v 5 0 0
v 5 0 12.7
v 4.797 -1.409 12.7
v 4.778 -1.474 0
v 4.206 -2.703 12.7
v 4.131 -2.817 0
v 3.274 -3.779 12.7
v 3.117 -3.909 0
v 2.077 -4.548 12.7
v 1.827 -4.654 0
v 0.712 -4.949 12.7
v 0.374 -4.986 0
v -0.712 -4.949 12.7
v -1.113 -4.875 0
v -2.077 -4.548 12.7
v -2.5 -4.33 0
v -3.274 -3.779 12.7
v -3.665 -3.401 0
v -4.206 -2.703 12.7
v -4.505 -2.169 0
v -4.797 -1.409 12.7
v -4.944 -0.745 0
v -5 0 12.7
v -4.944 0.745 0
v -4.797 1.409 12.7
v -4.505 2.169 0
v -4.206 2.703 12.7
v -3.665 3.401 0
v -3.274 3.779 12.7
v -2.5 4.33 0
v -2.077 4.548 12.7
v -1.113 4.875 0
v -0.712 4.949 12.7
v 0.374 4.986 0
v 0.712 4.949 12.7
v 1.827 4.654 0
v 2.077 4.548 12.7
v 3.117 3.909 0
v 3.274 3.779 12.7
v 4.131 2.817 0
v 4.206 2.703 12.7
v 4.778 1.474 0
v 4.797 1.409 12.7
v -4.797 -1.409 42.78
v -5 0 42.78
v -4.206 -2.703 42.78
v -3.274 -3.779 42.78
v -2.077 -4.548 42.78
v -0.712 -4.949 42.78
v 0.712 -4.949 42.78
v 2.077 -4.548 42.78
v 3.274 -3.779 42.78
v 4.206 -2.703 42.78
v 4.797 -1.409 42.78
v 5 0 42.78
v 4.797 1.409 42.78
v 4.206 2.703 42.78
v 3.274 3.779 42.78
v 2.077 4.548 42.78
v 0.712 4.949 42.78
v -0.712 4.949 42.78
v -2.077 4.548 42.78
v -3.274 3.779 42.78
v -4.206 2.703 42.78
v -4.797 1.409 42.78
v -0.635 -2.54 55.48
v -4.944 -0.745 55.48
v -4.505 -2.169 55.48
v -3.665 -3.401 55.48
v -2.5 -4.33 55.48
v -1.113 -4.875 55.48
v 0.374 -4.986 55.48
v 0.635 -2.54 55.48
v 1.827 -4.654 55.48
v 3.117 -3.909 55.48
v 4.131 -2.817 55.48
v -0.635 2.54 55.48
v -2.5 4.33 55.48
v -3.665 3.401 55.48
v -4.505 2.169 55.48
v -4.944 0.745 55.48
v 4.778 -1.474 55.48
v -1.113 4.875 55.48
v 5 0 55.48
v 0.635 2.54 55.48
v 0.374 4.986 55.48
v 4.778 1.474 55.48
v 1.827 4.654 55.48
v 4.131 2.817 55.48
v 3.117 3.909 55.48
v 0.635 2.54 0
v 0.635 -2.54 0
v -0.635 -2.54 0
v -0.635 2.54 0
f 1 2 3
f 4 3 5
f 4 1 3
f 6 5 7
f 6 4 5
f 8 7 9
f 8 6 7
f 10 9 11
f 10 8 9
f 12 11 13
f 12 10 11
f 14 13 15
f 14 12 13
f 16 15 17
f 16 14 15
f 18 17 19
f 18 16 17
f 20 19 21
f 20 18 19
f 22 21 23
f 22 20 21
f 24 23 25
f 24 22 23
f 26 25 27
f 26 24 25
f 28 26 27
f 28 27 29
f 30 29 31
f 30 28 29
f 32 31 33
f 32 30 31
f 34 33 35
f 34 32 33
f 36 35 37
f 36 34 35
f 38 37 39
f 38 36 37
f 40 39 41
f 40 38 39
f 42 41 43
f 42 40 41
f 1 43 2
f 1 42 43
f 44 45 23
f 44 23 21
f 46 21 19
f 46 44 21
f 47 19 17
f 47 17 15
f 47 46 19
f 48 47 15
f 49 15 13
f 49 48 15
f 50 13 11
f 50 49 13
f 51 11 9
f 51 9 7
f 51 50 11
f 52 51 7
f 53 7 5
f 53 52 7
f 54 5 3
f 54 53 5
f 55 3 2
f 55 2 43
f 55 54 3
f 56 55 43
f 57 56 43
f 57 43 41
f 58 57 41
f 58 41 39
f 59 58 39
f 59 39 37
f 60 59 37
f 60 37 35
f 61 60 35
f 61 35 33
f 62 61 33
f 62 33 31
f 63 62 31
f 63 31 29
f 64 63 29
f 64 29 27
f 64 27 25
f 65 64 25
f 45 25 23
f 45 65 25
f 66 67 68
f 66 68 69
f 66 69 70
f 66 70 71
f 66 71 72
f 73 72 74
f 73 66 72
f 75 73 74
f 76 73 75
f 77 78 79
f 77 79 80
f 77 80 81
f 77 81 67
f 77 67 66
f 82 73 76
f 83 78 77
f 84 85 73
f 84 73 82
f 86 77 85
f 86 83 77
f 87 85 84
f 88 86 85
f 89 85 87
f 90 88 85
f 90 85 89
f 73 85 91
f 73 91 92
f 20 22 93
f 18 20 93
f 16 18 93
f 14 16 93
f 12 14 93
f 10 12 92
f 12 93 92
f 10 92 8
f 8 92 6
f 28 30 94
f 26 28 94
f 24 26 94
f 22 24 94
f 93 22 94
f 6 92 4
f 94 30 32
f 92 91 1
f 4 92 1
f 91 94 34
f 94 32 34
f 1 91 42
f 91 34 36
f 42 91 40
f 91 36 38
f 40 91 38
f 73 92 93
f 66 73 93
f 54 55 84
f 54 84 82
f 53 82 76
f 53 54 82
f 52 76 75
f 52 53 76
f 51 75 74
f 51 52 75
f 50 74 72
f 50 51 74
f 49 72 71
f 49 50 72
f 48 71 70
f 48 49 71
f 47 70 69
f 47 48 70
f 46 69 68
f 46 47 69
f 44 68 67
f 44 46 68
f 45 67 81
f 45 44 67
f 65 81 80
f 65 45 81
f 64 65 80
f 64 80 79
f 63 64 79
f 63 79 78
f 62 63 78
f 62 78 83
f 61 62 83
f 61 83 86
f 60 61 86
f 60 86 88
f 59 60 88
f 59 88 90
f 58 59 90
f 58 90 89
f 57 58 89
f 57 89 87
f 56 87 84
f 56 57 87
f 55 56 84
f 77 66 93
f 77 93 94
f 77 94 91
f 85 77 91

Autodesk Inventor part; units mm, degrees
ref_plane "YZ Plane" through (0, 0, 0) normal (1, 0, 0) x (0, 1, 0)
ref_plane "XZ Plane" through (0, 0, 0) normal (0, 1, 0) x (-1, 0, 0)
sketch "Sketch1" plane through (0, 0, 0) normal (0, 0, 1) x (1, 0, 0)
  circle A0 centre (0, 0) radius 5
  dimension "d0" = 10
extrude "Extrusion1" add sketch "Sketch1" along normal blind 12.7
sketch "Sketch2" plane through (0, 0, 12.7) normal (0, 0, 1) x (1, 0, 0)
  point P0 (0, 0)
thread "Thread1" size "7/16-14 UNC" class "2A" standard "ANSI Unified Screw Threads" length 12.7
ref_plane "Work Plane1" through (0, 0, 42.78) normal (0, 0, 1) x (1, 0, 0)
sketch "Sketch3" plane through (0, 0, 42.78) normal (0, 0, 1) x (1, 0, 0)
  circle A0 centre (0, 0) radius 5 projected
extrude "Extrusion2" add sketch "Sketch3" along normal blind 12.7
thread "Thread2" size "7/16-14 UNC" class "2A" standard "ANSI Unified Screw Threads" length 12.7
sketch "Sketch4" plane through (0, 0, 42.78) normal (0, 0, -1) x (-1, 0, 0)
  circle A0 centre (0, 0) radius 5
extrude "Extrusion3" add sketch "Sketch4" along normal blind 30.08
sketch "Sketch5" plane through (0, 0, 55.48) normal (0, 0, 1) x (1, 0, 0)
  line L0 (-0.635, 2.54) -> (0.635, 2.54)
  line L1 (0.635, 2.54) -> (0.635, -2.54)
  line L2 (0.635, -2.54) -> (-0.635, -2.54)
  line L3 (-0.635, -2.54) -> (-0.635, 2.54)
  line L4 (-0.635, 2.54) -> (0.635, -2.54) construction
  line L5 (0.635, 2.54) -> (-0.635, -2.54) construction
  point P0 (0, 0)
  dimension "d15" = 1.27
  dimension "d16" = 5.08
extrude "Extrusion4" cut sketch "Sketch5" against normal through all
properties part number "Pedal Axle"
